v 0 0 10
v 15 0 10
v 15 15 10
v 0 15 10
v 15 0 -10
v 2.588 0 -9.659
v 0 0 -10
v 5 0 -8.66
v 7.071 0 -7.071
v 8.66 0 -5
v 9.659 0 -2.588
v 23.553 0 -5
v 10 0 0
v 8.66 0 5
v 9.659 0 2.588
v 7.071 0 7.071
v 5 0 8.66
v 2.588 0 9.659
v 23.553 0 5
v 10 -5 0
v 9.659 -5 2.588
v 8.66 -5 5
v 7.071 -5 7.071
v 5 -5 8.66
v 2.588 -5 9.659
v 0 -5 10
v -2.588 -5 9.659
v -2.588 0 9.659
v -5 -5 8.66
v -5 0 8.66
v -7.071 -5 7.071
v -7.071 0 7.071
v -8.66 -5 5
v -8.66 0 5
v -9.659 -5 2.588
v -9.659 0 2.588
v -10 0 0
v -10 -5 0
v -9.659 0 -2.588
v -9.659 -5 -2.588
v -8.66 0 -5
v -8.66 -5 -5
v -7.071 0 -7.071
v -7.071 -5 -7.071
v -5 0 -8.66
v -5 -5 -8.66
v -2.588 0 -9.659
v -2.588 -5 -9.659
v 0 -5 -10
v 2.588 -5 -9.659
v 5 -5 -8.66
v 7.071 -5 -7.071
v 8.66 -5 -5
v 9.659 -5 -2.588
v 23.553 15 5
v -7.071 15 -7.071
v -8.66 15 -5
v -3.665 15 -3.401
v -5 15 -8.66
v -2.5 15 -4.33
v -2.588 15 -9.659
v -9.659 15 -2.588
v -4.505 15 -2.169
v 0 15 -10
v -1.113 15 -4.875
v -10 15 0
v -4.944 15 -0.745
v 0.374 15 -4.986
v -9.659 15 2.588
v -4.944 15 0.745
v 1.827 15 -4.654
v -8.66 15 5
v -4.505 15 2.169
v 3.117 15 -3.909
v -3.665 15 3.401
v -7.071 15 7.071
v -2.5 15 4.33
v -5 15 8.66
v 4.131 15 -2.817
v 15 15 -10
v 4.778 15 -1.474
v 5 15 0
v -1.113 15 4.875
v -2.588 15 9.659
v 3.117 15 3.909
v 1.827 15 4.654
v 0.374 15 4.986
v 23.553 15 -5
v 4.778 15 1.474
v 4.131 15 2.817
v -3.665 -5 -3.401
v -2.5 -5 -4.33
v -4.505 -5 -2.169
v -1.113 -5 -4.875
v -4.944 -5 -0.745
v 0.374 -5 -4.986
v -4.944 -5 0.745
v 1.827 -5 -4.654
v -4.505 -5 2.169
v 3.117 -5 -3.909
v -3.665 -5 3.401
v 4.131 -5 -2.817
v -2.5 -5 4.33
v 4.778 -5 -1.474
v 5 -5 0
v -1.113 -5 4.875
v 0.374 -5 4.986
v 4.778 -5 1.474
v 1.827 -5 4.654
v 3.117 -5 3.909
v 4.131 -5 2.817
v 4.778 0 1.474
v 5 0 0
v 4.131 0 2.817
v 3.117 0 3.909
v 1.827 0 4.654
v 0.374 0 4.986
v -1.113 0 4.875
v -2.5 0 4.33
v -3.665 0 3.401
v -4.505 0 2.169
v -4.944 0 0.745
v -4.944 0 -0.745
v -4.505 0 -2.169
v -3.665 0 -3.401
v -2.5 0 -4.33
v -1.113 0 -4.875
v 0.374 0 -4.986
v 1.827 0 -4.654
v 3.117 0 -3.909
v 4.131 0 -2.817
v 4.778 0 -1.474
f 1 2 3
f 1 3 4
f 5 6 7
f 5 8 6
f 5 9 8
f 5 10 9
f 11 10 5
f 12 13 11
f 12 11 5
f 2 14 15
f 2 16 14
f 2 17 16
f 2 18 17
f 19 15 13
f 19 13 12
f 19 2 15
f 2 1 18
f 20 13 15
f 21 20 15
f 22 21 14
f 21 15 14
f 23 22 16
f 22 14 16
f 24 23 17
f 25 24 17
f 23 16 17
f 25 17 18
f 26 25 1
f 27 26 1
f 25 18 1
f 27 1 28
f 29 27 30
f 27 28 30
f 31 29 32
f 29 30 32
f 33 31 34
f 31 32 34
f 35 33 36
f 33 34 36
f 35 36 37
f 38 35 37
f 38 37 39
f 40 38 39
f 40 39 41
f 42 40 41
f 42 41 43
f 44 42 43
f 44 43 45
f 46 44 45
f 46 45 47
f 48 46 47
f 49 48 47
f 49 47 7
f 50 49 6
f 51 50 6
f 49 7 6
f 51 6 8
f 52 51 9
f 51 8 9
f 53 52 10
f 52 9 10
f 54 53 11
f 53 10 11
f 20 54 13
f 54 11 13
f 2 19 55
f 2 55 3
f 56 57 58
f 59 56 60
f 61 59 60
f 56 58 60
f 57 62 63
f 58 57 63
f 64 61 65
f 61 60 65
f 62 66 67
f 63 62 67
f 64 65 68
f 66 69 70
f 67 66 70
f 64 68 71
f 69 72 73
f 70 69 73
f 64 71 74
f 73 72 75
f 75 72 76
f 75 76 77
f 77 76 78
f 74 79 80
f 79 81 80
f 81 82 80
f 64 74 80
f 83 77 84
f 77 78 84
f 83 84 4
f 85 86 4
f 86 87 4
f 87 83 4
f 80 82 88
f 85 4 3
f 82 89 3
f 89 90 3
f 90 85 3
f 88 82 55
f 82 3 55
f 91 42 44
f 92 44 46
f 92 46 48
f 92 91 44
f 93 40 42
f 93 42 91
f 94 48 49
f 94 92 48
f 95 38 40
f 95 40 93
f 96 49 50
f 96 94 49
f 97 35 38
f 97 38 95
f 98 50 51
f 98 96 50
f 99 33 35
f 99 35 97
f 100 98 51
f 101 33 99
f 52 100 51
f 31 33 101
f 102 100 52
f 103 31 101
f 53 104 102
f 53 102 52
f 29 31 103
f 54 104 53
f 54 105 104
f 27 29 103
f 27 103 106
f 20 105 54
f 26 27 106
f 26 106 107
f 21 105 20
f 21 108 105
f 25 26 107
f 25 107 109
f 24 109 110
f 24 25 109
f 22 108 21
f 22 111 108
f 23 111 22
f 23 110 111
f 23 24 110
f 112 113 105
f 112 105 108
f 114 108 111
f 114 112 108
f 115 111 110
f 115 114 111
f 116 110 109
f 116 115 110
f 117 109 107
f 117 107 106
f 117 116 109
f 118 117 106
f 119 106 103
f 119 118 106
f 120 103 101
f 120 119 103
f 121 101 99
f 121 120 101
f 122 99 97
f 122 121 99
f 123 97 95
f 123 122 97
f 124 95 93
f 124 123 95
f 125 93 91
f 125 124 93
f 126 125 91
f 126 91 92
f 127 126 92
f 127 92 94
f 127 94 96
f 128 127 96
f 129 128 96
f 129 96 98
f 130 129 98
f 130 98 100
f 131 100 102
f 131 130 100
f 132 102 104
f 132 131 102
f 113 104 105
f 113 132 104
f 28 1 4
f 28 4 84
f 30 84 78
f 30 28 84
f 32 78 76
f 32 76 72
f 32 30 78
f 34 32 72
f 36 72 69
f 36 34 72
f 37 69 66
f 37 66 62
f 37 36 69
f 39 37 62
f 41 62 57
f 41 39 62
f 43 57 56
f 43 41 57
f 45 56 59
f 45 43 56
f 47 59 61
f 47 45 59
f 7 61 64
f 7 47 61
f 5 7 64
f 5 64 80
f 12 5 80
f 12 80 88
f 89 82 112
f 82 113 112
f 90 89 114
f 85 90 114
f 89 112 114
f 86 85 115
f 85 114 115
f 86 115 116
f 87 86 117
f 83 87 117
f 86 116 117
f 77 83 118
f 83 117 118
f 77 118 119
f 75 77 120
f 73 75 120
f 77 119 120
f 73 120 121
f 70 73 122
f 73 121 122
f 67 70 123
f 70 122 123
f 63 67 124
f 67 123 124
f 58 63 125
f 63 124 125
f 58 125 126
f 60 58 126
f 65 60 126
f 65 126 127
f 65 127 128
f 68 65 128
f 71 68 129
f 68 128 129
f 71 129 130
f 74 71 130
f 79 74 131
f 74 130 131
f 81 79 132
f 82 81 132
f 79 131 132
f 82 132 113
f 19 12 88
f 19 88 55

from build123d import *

# Parameters (mm, degrees)
F0_R     = 10
F0_R_2   = 5
F1_DEPTH = 5
F3_DEPTH = 15
F4_R     = 5
F5_DEPTH = 24.90763


with BuildPart() as f1:
    # F0 (on Front) → F1 (new body)
    with BuildSketch(Plane.XZ):
        Circle(F0_R)
        Circle(F0_R_2, mode=Mode.SUBTRACT)
    extrude(amount=F1_DEPTH)

    # F2 (on Front) → F3 (join)
    with BuildSketch(Plane.XZ):
        with BuildLine():
            ThreePointArc((0, -10), (7.071068, -7.071068), (10, 0))
            ThreePointArc((10, 0), (7.071068, 7.071068), (0, 10))
            ThreePointArc((0, 10), (-10, 0), (0, -10))
        make_face()
        with BuildLine():
            ThreePointArc((0, 10), (7.071068, 7.071068), (10, 0))
            ThreePointArc((10, 0), (7.071068, -7.071068), (0, -10))
            Line((0, -10), (15, -10))
            Line((15, -10), (23.552744, -5))
            Line((23.552744, -5), (23.552744, 5))
            Line((23.552744, 5), (15, 10))
            Line((15, 10), (0, 10))
        make_face()
    extrude(amount=-F3_DEPTH)

    # F4 (on Front) → F5 (cut, symmetric)
    with BuildSketch(Plane.XZ):
        Circle(F4_R)
    extrude(amount=F5_DEPTH, both=True, mode=Mode.SUBTRACT)


solid = f1.part
